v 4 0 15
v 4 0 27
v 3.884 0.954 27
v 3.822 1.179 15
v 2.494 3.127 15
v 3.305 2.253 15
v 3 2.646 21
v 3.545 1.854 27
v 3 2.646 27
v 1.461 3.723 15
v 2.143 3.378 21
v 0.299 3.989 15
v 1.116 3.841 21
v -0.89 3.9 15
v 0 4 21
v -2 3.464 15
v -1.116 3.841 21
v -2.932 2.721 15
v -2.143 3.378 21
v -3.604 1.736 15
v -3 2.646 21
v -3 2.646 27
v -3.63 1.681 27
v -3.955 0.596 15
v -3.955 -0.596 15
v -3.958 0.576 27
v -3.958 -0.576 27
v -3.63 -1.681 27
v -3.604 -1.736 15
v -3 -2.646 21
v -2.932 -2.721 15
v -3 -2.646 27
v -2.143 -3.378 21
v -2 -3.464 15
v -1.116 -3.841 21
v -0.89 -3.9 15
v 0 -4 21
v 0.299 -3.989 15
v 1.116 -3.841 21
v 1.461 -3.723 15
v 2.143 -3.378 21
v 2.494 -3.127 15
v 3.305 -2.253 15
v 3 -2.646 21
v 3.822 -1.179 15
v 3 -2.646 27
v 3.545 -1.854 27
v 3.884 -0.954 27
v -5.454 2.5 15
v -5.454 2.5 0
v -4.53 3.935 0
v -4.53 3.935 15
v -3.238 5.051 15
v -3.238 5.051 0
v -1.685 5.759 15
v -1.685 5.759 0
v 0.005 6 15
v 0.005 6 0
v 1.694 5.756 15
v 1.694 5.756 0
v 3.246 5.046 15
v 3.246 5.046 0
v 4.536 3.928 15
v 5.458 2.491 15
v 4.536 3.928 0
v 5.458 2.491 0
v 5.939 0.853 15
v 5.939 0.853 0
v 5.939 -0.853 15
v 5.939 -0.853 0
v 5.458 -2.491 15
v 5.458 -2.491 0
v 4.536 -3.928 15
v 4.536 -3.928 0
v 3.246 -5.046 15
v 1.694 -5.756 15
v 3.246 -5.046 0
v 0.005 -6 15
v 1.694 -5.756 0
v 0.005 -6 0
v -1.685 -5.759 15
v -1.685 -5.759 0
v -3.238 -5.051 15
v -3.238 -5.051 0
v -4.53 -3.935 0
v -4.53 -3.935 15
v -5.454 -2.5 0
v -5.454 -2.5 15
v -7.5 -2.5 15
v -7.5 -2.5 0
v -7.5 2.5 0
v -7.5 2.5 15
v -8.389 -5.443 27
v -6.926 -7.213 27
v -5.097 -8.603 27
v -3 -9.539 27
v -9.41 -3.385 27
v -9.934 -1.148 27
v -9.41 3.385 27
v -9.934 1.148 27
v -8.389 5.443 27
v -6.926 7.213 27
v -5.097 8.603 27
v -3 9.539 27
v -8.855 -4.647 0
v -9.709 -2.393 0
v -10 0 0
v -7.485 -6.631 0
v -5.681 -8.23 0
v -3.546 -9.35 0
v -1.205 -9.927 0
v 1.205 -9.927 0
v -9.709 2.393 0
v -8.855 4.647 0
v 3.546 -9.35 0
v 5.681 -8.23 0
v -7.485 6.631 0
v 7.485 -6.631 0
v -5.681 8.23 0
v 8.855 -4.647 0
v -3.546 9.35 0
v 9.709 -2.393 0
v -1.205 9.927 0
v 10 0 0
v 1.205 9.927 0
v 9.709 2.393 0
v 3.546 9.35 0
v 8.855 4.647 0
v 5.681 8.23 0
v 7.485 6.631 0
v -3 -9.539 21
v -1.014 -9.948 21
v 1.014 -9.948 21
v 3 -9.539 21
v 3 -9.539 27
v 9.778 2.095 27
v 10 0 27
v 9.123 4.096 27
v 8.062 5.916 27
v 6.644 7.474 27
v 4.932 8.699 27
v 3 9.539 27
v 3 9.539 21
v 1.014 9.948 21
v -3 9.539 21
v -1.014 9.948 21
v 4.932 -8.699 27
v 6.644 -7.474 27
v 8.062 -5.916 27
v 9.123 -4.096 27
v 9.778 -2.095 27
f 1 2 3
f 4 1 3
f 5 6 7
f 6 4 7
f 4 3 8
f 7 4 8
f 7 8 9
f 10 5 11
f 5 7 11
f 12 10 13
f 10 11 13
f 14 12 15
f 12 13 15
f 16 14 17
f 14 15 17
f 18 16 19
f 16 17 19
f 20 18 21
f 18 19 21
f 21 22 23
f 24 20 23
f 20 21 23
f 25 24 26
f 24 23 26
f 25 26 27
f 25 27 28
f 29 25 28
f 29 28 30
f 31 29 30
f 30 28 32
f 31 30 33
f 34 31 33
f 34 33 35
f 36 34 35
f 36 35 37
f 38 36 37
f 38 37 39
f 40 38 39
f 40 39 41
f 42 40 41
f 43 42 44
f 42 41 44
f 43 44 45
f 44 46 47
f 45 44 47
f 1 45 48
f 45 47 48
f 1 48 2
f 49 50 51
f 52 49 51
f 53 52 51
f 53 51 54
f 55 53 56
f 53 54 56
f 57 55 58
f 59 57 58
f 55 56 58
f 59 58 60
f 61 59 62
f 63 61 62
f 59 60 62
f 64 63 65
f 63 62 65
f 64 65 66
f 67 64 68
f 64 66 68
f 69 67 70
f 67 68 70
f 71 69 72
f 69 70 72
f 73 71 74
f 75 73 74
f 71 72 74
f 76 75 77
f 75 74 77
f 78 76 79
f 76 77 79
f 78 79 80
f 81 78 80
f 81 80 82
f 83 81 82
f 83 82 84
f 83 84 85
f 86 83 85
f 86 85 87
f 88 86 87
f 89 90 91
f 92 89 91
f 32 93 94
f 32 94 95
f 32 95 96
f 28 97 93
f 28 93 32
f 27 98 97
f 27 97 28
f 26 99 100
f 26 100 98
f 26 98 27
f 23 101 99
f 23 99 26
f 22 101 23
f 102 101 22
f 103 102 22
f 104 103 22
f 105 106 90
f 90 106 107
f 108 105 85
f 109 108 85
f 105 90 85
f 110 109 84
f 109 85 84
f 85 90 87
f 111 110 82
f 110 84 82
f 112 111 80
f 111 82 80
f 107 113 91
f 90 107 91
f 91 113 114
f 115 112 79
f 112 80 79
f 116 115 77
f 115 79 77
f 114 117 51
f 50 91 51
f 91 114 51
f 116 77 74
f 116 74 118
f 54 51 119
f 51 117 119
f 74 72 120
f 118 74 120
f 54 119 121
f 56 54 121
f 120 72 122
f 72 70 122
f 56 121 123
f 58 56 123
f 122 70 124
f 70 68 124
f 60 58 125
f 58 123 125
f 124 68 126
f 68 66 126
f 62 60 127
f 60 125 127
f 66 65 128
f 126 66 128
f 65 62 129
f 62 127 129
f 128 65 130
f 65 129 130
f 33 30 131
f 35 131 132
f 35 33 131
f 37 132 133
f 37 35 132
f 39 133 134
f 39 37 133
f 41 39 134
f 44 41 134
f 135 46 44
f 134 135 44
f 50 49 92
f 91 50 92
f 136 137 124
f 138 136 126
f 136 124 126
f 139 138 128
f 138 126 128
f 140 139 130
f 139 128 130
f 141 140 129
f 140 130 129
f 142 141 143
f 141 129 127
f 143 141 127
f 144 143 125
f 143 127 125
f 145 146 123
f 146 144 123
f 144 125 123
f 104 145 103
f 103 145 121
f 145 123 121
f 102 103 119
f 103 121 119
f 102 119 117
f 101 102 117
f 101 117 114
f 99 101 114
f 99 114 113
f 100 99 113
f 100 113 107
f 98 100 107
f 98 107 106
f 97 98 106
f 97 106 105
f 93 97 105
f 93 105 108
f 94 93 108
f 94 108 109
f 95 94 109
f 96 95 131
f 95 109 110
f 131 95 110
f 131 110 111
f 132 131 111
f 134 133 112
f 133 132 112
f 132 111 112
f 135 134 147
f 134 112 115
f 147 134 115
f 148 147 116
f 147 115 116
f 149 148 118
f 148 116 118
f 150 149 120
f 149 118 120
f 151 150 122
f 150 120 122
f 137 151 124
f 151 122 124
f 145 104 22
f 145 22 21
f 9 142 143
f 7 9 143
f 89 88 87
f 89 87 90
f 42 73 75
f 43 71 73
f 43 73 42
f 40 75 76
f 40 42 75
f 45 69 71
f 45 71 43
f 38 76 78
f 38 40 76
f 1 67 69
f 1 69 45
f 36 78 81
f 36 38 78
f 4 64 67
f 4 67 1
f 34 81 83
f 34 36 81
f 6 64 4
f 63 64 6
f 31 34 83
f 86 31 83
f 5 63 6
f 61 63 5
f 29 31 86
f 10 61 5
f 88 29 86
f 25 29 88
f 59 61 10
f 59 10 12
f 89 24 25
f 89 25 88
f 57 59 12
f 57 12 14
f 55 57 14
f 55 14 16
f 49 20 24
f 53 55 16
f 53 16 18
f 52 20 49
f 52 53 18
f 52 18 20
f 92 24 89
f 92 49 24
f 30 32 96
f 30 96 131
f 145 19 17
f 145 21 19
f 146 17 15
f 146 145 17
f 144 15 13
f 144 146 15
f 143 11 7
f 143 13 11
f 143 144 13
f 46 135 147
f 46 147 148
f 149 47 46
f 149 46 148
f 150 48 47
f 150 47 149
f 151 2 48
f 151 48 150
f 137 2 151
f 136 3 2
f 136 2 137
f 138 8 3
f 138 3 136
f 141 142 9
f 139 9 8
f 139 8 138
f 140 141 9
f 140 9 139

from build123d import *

# Parameters (mm, degrees)
SKETCH1_R           = 10
BOSS_EXTRUDE1_DEPTH = 27
SKETCH2_R           = 4
CUT_EXTRUDE1_DEPTH  = 140
SKETCH3_R           = 6
CUT_EXTRUDE2_DEPTH  = 15
SKETCH4_W           = 6
SKETCH4_H           = 6
CUT_EXTRUDE3_DEPTH  = 15
SKETCH5_W           = 3.5796646
SKETCH5_H           = 5
CUT_EXTRUDE4_DEPTH  = 15


with BuildPart() as part:
    # Sketch1 → Boss-Extrude1 (new body)
    with BuildSketch(Plane.XY):
        Circle(SKETCH1_R)
    extrude(amount=BOSS_EXTRUDE1_DEPTH)

    # Sketch2 → Cut-Extrude1 (cut)
    with BuildSketch(Plane.XY.offset(27)):
        Circle(SKETCH2_R)
    extrude(amount=-CUT_EXTRUDE1_DEPTH, mode=Mode.SUBTRACT)

    # Sketch3 → Cut-Extrude2 (cut)
    with BuildSketch(Plane(origin=(0, 0, 0), x_dir=(-1, 0, 0), z_dir=(0, 0, -1))):
        Circle(SKETCH3_R)
    extrude(amount=-CUT_EXTRUDE2_DEPTH, mode=Mode.SUBTRACT)

    # Sketch4 → Cut-Extrude3 (cut, symmetric)
    with BuildSketch(Plane(origin=(0, 0, 0), x_dir=(1, 0, 0), z_dir=(0, 1, 0))):
        with Locations((0, -24)):
            Rectangle(SKETCH4_W, SKETCH4_H)
    extrude(amount=CUT_EXTRUDE3_DEPTH, both=True, mode=Mode.SUBTRACT)

    # Sketch5 → Cut-Extrude4 (cut)
    with BuildSketch(Plane(origin=(0, 0, 0), x_dir=(-1, 0, 0), z_dir=(0, 0, -1))):
        with Locations((5.7101677, 0)):
            Rectangle(SKETCH5_W, SKETCH5_H)
    extrude(amount=-CUT_EXTRUDE4_DEPTH, mode=Mode.SUBTRACT)


solid = part.part
